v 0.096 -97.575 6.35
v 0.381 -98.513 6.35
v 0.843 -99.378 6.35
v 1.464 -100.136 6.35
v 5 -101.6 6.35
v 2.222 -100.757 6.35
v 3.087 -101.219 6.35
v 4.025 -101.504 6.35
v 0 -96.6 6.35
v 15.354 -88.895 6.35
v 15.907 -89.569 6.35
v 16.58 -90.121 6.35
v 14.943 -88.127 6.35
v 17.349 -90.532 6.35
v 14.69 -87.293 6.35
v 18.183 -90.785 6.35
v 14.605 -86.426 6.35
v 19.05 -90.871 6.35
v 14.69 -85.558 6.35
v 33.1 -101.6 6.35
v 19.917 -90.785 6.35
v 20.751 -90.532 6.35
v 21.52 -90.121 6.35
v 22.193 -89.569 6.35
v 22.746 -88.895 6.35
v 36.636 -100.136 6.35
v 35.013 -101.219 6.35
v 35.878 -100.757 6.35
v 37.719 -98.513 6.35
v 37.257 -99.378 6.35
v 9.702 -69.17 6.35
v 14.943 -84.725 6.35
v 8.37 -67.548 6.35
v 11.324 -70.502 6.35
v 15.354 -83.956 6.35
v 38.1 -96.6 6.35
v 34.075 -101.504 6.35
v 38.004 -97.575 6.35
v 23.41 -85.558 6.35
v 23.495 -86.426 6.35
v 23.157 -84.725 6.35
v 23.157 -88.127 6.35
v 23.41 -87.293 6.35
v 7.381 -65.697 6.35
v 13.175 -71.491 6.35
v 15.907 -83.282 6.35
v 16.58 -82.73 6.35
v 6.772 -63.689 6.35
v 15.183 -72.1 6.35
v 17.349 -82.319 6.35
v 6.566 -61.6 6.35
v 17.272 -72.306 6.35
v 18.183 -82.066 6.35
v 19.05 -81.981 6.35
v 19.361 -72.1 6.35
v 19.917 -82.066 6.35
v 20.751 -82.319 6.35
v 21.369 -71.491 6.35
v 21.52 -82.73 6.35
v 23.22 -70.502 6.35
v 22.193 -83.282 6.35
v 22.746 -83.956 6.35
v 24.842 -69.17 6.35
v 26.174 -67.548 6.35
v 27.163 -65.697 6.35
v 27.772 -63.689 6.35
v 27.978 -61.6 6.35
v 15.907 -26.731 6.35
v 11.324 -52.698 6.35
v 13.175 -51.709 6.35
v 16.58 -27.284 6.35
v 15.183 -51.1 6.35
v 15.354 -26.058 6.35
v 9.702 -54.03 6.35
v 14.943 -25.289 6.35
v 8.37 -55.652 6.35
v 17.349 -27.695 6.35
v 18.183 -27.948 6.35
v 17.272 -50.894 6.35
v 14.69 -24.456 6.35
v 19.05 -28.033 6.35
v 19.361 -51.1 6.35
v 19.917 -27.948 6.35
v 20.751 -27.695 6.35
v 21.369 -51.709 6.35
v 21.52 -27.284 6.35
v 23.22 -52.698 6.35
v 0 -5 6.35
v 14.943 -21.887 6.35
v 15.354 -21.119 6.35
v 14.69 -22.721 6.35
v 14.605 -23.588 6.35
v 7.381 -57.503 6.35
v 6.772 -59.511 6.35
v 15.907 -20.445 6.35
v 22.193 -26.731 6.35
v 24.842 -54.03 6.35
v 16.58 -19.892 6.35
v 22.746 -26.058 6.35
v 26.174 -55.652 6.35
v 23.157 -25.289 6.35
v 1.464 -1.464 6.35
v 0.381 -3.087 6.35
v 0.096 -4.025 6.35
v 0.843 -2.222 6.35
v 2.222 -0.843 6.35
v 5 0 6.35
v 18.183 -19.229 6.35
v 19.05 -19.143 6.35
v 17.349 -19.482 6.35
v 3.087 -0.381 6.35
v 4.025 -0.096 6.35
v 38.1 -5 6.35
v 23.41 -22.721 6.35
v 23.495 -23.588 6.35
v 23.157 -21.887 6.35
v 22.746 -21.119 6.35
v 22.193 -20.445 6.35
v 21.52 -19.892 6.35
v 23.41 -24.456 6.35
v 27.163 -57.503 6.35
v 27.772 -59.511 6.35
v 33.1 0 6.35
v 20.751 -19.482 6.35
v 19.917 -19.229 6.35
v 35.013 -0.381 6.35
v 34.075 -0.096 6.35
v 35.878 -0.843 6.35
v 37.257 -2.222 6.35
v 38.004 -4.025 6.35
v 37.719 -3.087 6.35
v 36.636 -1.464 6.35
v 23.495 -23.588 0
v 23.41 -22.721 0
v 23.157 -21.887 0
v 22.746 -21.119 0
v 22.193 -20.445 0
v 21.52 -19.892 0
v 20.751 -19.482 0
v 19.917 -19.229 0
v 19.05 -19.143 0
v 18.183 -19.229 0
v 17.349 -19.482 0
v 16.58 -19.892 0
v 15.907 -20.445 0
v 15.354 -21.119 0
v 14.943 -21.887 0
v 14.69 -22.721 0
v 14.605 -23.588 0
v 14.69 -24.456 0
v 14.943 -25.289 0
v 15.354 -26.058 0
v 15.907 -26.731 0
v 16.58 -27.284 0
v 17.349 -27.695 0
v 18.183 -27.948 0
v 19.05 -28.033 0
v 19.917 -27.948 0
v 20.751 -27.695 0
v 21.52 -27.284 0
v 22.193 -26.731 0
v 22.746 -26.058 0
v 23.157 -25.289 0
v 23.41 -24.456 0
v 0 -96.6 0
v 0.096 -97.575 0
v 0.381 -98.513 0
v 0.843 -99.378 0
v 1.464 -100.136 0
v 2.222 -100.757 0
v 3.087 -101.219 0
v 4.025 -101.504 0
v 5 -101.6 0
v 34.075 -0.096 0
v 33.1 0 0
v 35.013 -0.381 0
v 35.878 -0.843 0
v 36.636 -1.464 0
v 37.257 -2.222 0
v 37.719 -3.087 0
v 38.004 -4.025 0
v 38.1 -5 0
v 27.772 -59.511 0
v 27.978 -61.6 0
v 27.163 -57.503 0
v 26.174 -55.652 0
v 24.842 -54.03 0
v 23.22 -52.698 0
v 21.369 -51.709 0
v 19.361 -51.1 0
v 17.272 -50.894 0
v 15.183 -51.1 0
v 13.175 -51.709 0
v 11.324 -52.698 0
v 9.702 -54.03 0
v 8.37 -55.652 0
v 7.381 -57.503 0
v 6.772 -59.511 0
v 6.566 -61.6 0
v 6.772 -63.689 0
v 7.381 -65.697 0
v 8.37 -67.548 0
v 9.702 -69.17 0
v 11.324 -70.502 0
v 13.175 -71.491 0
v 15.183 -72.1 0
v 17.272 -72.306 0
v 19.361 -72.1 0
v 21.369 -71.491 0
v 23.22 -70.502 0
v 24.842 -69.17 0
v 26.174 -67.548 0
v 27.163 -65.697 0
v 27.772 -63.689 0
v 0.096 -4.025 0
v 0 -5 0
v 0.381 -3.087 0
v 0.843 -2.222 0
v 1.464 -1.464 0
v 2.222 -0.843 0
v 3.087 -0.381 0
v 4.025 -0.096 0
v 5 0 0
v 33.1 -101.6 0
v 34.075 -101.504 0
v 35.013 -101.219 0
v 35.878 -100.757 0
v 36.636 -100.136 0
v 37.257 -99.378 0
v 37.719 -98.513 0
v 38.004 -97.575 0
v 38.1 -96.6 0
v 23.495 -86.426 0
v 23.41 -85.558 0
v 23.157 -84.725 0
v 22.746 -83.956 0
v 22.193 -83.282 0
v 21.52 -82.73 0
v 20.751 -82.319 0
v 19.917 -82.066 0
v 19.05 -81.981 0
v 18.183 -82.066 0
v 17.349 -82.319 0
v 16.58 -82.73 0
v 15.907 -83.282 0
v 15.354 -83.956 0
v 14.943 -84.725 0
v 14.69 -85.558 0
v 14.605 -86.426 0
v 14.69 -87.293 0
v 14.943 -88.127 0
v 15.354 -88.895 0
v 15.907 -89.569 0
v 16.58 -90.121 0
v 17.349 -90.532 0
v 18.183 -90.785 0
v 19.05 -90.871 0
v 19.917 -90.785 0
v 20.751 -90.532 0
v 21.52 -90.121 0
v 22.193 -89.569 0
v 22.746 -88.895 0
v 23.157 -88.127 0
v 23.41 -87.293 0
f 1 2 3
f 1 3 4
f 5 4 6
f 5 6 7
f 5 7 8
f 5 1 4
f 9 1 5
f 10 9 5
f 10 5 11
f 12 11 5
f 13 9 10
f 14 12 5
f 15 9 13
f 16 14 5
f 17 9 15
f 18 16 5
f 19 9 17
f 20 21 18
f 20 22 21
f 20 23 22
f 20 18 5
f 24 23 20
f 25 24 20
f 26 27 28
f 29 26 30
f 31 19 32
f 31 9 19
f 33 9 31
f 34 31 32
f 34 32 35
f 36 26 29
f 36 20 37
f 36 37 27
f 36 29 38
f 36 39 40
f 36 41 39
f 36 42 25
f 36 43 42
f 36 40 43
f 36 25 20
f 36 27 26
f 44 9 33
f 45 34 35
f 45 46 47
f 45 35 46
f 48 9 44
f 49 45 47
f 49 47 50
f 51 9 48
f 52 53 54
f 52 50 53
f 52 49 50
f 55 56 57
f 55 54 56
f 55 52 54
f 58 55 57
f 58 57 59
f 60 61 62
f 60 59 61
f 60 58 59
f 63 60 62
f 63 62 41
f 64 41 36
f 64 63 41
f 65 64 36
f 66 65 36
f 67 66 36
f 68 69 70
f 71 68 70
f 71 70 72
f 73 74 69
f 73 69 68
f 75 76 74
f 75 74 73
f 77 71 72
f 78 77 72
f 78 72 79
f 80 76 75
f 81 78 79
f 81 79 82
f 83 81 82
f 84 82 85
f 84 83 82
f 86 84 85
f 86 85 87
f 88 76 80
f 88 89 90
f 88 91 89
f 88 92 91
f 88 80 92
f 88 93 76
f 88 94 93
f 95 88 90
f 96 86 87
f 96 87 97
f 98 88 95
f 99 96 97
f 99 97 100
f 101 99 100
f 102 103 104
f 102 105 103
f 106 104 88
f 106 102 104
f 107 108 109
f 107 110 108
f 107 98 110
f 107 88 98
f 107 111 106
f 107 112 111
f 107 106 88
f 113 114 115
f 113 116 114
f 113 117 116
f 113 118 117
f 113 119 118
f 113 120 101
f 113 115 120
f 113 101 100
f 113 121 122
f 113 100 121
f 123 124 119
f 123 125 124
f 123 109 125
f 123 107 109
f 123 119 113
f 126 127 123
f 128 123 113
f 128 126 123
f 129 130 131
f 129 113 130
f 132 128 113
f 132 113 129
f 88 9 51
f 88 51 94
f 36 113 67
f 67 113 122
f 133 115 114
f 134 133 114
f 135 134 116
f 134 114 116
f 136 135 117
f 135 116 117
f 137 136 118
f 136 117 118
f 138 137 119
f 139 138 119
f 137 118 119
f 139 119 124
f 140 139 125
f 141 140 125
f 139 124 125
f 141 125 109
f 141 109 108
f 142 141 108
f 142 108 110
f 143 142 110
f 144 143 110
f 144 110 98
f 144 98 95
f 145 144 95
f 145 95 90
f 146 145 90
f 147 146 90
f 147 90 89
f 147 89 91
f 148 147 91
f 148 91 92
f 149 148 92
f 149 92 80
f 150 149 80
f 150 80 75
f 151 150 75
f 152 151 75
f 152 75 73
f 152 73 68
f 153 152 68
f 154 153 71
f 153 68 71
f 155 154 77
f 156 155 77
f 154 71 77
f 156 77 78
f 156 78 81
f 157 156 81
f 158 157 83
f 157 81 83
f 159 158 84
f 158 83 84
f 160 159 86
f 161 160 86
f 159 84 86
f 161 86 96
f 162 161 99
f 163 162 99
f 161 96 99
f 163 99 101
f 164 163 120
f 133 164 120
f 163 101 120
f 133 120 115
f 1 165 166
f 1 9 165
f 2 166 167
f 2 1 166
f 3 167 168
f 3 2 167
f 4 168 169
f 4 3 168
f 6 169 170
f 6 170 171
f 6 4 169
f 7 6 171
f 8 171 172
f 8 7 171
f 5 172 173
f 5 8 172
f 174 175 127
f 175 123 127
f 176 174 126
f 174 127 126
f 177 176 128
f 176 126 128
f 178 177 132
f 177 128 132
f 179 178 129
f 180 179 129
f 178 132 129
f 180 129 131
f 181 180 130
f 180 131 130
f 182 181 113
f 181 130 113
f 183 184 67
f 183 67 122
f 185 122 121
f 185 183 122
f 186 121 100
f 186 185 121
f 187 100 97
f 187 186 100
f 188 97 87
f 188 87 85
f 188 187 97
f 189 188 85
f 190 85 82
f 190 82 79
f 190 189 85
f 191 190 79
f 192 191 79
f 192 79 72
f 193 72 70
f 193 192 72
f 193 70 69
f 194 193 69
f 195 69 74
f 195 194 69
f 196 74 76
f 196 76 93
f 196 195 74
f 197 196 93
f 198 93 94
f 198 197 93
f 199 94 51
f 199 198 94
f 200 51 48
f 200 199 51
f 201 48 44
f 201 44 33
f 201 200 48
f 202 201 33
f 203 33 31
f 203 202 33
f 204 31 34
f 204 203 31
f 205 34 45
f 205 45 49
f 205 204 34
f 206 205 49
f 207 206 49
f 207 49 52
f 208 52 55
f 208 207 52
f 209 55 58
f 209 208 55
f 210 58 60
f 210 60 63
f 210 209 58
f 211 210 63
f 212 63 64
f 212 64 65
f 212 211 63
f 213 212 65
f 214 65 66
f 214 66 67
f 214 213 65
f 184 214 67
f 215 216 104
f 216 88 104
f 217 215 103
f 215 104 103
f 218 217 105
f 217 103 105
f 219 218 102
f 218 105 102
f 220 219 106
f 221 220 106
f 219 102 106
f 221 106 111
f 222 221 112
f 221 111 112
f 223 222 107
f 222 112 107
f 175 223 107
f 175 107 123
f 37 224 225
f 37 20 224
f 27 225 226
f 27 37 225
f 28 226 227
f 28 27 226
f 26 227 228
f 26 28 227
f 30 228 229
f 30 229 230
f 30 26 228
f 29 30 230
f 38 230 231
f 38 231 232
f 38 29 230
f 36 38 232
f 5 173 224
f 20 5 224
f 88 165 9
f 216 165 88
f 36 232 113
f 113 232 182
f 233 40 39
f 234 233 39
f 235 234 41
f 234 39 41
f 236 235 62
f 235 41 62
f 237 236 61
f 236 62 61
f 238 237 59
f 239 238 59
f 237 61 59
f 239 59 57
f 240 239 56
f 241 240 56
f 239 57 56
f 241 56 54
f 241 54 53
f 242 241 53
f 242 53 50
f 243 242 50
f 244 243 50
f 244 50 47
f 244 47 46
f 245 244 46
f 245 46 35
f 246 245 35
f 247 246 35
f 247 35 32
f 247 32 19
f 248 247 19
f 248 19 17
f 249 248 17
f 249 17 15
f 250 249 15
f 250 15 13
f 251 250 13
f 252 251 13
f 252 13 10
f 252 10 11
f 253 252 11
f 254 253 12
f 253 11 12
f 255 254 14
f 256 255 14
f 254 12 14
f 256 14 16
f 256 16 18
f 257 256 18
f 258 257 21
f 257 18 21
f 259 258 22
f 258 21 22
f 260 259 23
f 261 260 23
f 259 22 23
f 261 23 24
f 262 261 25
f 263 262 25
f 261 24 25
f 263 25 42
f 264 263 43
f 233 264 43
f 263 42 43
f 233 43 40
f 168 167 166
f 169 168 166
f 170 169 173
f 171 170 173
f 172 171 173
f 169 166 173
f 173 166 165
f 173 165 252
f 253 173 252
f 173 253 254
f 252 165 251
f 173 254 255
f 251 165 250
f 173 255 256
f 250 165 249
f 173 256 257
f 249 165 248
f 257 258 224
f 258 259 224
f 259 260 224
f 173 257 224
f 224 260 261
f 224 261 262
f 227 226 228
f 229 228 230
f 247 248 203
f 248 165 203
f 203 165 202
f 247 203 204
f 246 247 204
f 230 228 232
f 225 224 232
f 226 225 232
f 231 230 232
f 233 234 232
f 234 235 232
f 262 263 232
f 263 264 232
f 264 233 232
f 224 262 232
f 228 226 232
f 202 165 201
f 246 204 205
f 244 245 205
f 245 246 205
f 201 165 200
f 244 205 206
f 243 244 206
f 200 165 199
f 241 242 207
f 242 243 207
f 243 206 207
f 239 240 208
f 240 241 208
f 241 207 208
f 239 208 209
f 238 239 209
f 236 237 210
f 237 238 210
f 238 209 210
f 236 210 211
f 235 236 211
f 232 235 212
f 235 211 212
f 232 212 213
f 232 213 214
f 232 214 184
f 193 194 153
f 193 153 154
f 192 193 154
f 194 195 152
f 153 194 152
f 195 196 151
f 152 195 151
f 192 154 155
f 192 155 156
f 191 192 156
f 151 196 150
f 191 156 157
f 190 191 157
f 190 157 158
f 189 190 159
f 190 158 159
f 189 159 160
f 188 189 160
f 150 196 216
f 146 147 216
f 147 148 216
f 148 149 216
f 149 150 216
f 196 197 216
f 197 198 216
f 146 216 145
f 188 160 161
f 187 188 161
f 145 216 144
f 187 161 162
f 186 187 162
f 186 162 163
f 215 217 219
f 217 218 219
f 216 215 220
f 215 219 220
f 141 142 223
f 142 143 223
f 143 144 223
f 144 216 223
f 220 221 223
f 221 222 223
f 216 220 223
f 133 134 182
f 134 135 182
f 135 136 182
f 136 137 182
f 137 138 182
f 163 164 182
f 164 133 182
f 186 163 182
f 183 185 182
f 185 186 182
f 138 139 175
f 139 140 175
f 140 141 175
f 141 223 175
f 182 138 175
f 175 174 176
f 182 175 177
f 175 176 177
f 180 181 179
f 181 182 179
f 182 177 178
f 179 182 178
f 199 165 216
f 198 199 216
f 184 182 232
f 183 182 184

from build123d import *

# Parameters (mm, degrees)
SKETCH1_W           = 38.1
SKETCH1_H           = 101.6
SKETCH1_R           = 10.7061
BOSS_EXTRUDE1_DEPTH = 6.35
CUT_EXTRUDE1_REACH  = 110.694
SKETCH2_R           = 4.445
FILLET1_R           = 5


with BuildPart() as part:
    # Sketch1 → Boss-Extrude1 (new body)
    with BuildSketch(Plane.XY):
        with Locations((19.05, -50.8)):
            Rectangle(SKETCH1_W, SKETCH1_H)
        with Locations((17.272, -61.6)):
            Circle(SKETCH1_R, mode=Mode.SUBTRACT)
    extrude(amount=BOSS_EXTRUDE1_DEPTH)

    # Sketch2 → Cut-Extrude1 (cut, up to next)
    with BuildSketch(Plane.XY.offset(6.35), mode=Mode.PRIVATE) as cut_extrude1_sk1:
        with Locations((19.05, -23.588381621)):
            Circle(SKETCH2_R)
    cut_extrude1_tool1 = extrude(cut_extrude1_sk1.sketch, amount=-CUT_EXTRUDE1_REACH, mode=Mode.PRIVATE) & part.part
    # Sketch2 → Cut-Extrude1 (cut, up to next)
    with BuildSketch(Plane.XY.offset(6.35), mode=Mode.PRIVATE) as cut_extrude1_sk2:
        with Locations((19.05, -86.425541616)):
            Circle(SKETCH2_R)
    cut_extrude1_tool2 = extrude(cut_extrude1_sk2.sketch, amount=-CUT_EXTRUDE1_REACH, mode=Mode.PRIVATE) & part.part
    add(cut_extrude1_tool1.solids().sort_by_distance((19.05, -23.588382, 6.35))[0], mode=Mode.SUBTRACT)
    add(cut_extrude1_tool2.solids().sort_by_distance((19.05, -86.425542, 6.35))[0], mode=Mode.SUBTRACT)

    # Fillet1
    fillet1_edges = [part.edges().sort_by_distance(p)[0] for p in [
        (0, 0, 3.175),
        (38.1, 0, 3.175),
        (38.1, -101.6, 3.175),
        (0, -101.6, 3.175),
    ]]
    fillet(fillet1_edges, radius=FILLET1_R)


solid = part.part
